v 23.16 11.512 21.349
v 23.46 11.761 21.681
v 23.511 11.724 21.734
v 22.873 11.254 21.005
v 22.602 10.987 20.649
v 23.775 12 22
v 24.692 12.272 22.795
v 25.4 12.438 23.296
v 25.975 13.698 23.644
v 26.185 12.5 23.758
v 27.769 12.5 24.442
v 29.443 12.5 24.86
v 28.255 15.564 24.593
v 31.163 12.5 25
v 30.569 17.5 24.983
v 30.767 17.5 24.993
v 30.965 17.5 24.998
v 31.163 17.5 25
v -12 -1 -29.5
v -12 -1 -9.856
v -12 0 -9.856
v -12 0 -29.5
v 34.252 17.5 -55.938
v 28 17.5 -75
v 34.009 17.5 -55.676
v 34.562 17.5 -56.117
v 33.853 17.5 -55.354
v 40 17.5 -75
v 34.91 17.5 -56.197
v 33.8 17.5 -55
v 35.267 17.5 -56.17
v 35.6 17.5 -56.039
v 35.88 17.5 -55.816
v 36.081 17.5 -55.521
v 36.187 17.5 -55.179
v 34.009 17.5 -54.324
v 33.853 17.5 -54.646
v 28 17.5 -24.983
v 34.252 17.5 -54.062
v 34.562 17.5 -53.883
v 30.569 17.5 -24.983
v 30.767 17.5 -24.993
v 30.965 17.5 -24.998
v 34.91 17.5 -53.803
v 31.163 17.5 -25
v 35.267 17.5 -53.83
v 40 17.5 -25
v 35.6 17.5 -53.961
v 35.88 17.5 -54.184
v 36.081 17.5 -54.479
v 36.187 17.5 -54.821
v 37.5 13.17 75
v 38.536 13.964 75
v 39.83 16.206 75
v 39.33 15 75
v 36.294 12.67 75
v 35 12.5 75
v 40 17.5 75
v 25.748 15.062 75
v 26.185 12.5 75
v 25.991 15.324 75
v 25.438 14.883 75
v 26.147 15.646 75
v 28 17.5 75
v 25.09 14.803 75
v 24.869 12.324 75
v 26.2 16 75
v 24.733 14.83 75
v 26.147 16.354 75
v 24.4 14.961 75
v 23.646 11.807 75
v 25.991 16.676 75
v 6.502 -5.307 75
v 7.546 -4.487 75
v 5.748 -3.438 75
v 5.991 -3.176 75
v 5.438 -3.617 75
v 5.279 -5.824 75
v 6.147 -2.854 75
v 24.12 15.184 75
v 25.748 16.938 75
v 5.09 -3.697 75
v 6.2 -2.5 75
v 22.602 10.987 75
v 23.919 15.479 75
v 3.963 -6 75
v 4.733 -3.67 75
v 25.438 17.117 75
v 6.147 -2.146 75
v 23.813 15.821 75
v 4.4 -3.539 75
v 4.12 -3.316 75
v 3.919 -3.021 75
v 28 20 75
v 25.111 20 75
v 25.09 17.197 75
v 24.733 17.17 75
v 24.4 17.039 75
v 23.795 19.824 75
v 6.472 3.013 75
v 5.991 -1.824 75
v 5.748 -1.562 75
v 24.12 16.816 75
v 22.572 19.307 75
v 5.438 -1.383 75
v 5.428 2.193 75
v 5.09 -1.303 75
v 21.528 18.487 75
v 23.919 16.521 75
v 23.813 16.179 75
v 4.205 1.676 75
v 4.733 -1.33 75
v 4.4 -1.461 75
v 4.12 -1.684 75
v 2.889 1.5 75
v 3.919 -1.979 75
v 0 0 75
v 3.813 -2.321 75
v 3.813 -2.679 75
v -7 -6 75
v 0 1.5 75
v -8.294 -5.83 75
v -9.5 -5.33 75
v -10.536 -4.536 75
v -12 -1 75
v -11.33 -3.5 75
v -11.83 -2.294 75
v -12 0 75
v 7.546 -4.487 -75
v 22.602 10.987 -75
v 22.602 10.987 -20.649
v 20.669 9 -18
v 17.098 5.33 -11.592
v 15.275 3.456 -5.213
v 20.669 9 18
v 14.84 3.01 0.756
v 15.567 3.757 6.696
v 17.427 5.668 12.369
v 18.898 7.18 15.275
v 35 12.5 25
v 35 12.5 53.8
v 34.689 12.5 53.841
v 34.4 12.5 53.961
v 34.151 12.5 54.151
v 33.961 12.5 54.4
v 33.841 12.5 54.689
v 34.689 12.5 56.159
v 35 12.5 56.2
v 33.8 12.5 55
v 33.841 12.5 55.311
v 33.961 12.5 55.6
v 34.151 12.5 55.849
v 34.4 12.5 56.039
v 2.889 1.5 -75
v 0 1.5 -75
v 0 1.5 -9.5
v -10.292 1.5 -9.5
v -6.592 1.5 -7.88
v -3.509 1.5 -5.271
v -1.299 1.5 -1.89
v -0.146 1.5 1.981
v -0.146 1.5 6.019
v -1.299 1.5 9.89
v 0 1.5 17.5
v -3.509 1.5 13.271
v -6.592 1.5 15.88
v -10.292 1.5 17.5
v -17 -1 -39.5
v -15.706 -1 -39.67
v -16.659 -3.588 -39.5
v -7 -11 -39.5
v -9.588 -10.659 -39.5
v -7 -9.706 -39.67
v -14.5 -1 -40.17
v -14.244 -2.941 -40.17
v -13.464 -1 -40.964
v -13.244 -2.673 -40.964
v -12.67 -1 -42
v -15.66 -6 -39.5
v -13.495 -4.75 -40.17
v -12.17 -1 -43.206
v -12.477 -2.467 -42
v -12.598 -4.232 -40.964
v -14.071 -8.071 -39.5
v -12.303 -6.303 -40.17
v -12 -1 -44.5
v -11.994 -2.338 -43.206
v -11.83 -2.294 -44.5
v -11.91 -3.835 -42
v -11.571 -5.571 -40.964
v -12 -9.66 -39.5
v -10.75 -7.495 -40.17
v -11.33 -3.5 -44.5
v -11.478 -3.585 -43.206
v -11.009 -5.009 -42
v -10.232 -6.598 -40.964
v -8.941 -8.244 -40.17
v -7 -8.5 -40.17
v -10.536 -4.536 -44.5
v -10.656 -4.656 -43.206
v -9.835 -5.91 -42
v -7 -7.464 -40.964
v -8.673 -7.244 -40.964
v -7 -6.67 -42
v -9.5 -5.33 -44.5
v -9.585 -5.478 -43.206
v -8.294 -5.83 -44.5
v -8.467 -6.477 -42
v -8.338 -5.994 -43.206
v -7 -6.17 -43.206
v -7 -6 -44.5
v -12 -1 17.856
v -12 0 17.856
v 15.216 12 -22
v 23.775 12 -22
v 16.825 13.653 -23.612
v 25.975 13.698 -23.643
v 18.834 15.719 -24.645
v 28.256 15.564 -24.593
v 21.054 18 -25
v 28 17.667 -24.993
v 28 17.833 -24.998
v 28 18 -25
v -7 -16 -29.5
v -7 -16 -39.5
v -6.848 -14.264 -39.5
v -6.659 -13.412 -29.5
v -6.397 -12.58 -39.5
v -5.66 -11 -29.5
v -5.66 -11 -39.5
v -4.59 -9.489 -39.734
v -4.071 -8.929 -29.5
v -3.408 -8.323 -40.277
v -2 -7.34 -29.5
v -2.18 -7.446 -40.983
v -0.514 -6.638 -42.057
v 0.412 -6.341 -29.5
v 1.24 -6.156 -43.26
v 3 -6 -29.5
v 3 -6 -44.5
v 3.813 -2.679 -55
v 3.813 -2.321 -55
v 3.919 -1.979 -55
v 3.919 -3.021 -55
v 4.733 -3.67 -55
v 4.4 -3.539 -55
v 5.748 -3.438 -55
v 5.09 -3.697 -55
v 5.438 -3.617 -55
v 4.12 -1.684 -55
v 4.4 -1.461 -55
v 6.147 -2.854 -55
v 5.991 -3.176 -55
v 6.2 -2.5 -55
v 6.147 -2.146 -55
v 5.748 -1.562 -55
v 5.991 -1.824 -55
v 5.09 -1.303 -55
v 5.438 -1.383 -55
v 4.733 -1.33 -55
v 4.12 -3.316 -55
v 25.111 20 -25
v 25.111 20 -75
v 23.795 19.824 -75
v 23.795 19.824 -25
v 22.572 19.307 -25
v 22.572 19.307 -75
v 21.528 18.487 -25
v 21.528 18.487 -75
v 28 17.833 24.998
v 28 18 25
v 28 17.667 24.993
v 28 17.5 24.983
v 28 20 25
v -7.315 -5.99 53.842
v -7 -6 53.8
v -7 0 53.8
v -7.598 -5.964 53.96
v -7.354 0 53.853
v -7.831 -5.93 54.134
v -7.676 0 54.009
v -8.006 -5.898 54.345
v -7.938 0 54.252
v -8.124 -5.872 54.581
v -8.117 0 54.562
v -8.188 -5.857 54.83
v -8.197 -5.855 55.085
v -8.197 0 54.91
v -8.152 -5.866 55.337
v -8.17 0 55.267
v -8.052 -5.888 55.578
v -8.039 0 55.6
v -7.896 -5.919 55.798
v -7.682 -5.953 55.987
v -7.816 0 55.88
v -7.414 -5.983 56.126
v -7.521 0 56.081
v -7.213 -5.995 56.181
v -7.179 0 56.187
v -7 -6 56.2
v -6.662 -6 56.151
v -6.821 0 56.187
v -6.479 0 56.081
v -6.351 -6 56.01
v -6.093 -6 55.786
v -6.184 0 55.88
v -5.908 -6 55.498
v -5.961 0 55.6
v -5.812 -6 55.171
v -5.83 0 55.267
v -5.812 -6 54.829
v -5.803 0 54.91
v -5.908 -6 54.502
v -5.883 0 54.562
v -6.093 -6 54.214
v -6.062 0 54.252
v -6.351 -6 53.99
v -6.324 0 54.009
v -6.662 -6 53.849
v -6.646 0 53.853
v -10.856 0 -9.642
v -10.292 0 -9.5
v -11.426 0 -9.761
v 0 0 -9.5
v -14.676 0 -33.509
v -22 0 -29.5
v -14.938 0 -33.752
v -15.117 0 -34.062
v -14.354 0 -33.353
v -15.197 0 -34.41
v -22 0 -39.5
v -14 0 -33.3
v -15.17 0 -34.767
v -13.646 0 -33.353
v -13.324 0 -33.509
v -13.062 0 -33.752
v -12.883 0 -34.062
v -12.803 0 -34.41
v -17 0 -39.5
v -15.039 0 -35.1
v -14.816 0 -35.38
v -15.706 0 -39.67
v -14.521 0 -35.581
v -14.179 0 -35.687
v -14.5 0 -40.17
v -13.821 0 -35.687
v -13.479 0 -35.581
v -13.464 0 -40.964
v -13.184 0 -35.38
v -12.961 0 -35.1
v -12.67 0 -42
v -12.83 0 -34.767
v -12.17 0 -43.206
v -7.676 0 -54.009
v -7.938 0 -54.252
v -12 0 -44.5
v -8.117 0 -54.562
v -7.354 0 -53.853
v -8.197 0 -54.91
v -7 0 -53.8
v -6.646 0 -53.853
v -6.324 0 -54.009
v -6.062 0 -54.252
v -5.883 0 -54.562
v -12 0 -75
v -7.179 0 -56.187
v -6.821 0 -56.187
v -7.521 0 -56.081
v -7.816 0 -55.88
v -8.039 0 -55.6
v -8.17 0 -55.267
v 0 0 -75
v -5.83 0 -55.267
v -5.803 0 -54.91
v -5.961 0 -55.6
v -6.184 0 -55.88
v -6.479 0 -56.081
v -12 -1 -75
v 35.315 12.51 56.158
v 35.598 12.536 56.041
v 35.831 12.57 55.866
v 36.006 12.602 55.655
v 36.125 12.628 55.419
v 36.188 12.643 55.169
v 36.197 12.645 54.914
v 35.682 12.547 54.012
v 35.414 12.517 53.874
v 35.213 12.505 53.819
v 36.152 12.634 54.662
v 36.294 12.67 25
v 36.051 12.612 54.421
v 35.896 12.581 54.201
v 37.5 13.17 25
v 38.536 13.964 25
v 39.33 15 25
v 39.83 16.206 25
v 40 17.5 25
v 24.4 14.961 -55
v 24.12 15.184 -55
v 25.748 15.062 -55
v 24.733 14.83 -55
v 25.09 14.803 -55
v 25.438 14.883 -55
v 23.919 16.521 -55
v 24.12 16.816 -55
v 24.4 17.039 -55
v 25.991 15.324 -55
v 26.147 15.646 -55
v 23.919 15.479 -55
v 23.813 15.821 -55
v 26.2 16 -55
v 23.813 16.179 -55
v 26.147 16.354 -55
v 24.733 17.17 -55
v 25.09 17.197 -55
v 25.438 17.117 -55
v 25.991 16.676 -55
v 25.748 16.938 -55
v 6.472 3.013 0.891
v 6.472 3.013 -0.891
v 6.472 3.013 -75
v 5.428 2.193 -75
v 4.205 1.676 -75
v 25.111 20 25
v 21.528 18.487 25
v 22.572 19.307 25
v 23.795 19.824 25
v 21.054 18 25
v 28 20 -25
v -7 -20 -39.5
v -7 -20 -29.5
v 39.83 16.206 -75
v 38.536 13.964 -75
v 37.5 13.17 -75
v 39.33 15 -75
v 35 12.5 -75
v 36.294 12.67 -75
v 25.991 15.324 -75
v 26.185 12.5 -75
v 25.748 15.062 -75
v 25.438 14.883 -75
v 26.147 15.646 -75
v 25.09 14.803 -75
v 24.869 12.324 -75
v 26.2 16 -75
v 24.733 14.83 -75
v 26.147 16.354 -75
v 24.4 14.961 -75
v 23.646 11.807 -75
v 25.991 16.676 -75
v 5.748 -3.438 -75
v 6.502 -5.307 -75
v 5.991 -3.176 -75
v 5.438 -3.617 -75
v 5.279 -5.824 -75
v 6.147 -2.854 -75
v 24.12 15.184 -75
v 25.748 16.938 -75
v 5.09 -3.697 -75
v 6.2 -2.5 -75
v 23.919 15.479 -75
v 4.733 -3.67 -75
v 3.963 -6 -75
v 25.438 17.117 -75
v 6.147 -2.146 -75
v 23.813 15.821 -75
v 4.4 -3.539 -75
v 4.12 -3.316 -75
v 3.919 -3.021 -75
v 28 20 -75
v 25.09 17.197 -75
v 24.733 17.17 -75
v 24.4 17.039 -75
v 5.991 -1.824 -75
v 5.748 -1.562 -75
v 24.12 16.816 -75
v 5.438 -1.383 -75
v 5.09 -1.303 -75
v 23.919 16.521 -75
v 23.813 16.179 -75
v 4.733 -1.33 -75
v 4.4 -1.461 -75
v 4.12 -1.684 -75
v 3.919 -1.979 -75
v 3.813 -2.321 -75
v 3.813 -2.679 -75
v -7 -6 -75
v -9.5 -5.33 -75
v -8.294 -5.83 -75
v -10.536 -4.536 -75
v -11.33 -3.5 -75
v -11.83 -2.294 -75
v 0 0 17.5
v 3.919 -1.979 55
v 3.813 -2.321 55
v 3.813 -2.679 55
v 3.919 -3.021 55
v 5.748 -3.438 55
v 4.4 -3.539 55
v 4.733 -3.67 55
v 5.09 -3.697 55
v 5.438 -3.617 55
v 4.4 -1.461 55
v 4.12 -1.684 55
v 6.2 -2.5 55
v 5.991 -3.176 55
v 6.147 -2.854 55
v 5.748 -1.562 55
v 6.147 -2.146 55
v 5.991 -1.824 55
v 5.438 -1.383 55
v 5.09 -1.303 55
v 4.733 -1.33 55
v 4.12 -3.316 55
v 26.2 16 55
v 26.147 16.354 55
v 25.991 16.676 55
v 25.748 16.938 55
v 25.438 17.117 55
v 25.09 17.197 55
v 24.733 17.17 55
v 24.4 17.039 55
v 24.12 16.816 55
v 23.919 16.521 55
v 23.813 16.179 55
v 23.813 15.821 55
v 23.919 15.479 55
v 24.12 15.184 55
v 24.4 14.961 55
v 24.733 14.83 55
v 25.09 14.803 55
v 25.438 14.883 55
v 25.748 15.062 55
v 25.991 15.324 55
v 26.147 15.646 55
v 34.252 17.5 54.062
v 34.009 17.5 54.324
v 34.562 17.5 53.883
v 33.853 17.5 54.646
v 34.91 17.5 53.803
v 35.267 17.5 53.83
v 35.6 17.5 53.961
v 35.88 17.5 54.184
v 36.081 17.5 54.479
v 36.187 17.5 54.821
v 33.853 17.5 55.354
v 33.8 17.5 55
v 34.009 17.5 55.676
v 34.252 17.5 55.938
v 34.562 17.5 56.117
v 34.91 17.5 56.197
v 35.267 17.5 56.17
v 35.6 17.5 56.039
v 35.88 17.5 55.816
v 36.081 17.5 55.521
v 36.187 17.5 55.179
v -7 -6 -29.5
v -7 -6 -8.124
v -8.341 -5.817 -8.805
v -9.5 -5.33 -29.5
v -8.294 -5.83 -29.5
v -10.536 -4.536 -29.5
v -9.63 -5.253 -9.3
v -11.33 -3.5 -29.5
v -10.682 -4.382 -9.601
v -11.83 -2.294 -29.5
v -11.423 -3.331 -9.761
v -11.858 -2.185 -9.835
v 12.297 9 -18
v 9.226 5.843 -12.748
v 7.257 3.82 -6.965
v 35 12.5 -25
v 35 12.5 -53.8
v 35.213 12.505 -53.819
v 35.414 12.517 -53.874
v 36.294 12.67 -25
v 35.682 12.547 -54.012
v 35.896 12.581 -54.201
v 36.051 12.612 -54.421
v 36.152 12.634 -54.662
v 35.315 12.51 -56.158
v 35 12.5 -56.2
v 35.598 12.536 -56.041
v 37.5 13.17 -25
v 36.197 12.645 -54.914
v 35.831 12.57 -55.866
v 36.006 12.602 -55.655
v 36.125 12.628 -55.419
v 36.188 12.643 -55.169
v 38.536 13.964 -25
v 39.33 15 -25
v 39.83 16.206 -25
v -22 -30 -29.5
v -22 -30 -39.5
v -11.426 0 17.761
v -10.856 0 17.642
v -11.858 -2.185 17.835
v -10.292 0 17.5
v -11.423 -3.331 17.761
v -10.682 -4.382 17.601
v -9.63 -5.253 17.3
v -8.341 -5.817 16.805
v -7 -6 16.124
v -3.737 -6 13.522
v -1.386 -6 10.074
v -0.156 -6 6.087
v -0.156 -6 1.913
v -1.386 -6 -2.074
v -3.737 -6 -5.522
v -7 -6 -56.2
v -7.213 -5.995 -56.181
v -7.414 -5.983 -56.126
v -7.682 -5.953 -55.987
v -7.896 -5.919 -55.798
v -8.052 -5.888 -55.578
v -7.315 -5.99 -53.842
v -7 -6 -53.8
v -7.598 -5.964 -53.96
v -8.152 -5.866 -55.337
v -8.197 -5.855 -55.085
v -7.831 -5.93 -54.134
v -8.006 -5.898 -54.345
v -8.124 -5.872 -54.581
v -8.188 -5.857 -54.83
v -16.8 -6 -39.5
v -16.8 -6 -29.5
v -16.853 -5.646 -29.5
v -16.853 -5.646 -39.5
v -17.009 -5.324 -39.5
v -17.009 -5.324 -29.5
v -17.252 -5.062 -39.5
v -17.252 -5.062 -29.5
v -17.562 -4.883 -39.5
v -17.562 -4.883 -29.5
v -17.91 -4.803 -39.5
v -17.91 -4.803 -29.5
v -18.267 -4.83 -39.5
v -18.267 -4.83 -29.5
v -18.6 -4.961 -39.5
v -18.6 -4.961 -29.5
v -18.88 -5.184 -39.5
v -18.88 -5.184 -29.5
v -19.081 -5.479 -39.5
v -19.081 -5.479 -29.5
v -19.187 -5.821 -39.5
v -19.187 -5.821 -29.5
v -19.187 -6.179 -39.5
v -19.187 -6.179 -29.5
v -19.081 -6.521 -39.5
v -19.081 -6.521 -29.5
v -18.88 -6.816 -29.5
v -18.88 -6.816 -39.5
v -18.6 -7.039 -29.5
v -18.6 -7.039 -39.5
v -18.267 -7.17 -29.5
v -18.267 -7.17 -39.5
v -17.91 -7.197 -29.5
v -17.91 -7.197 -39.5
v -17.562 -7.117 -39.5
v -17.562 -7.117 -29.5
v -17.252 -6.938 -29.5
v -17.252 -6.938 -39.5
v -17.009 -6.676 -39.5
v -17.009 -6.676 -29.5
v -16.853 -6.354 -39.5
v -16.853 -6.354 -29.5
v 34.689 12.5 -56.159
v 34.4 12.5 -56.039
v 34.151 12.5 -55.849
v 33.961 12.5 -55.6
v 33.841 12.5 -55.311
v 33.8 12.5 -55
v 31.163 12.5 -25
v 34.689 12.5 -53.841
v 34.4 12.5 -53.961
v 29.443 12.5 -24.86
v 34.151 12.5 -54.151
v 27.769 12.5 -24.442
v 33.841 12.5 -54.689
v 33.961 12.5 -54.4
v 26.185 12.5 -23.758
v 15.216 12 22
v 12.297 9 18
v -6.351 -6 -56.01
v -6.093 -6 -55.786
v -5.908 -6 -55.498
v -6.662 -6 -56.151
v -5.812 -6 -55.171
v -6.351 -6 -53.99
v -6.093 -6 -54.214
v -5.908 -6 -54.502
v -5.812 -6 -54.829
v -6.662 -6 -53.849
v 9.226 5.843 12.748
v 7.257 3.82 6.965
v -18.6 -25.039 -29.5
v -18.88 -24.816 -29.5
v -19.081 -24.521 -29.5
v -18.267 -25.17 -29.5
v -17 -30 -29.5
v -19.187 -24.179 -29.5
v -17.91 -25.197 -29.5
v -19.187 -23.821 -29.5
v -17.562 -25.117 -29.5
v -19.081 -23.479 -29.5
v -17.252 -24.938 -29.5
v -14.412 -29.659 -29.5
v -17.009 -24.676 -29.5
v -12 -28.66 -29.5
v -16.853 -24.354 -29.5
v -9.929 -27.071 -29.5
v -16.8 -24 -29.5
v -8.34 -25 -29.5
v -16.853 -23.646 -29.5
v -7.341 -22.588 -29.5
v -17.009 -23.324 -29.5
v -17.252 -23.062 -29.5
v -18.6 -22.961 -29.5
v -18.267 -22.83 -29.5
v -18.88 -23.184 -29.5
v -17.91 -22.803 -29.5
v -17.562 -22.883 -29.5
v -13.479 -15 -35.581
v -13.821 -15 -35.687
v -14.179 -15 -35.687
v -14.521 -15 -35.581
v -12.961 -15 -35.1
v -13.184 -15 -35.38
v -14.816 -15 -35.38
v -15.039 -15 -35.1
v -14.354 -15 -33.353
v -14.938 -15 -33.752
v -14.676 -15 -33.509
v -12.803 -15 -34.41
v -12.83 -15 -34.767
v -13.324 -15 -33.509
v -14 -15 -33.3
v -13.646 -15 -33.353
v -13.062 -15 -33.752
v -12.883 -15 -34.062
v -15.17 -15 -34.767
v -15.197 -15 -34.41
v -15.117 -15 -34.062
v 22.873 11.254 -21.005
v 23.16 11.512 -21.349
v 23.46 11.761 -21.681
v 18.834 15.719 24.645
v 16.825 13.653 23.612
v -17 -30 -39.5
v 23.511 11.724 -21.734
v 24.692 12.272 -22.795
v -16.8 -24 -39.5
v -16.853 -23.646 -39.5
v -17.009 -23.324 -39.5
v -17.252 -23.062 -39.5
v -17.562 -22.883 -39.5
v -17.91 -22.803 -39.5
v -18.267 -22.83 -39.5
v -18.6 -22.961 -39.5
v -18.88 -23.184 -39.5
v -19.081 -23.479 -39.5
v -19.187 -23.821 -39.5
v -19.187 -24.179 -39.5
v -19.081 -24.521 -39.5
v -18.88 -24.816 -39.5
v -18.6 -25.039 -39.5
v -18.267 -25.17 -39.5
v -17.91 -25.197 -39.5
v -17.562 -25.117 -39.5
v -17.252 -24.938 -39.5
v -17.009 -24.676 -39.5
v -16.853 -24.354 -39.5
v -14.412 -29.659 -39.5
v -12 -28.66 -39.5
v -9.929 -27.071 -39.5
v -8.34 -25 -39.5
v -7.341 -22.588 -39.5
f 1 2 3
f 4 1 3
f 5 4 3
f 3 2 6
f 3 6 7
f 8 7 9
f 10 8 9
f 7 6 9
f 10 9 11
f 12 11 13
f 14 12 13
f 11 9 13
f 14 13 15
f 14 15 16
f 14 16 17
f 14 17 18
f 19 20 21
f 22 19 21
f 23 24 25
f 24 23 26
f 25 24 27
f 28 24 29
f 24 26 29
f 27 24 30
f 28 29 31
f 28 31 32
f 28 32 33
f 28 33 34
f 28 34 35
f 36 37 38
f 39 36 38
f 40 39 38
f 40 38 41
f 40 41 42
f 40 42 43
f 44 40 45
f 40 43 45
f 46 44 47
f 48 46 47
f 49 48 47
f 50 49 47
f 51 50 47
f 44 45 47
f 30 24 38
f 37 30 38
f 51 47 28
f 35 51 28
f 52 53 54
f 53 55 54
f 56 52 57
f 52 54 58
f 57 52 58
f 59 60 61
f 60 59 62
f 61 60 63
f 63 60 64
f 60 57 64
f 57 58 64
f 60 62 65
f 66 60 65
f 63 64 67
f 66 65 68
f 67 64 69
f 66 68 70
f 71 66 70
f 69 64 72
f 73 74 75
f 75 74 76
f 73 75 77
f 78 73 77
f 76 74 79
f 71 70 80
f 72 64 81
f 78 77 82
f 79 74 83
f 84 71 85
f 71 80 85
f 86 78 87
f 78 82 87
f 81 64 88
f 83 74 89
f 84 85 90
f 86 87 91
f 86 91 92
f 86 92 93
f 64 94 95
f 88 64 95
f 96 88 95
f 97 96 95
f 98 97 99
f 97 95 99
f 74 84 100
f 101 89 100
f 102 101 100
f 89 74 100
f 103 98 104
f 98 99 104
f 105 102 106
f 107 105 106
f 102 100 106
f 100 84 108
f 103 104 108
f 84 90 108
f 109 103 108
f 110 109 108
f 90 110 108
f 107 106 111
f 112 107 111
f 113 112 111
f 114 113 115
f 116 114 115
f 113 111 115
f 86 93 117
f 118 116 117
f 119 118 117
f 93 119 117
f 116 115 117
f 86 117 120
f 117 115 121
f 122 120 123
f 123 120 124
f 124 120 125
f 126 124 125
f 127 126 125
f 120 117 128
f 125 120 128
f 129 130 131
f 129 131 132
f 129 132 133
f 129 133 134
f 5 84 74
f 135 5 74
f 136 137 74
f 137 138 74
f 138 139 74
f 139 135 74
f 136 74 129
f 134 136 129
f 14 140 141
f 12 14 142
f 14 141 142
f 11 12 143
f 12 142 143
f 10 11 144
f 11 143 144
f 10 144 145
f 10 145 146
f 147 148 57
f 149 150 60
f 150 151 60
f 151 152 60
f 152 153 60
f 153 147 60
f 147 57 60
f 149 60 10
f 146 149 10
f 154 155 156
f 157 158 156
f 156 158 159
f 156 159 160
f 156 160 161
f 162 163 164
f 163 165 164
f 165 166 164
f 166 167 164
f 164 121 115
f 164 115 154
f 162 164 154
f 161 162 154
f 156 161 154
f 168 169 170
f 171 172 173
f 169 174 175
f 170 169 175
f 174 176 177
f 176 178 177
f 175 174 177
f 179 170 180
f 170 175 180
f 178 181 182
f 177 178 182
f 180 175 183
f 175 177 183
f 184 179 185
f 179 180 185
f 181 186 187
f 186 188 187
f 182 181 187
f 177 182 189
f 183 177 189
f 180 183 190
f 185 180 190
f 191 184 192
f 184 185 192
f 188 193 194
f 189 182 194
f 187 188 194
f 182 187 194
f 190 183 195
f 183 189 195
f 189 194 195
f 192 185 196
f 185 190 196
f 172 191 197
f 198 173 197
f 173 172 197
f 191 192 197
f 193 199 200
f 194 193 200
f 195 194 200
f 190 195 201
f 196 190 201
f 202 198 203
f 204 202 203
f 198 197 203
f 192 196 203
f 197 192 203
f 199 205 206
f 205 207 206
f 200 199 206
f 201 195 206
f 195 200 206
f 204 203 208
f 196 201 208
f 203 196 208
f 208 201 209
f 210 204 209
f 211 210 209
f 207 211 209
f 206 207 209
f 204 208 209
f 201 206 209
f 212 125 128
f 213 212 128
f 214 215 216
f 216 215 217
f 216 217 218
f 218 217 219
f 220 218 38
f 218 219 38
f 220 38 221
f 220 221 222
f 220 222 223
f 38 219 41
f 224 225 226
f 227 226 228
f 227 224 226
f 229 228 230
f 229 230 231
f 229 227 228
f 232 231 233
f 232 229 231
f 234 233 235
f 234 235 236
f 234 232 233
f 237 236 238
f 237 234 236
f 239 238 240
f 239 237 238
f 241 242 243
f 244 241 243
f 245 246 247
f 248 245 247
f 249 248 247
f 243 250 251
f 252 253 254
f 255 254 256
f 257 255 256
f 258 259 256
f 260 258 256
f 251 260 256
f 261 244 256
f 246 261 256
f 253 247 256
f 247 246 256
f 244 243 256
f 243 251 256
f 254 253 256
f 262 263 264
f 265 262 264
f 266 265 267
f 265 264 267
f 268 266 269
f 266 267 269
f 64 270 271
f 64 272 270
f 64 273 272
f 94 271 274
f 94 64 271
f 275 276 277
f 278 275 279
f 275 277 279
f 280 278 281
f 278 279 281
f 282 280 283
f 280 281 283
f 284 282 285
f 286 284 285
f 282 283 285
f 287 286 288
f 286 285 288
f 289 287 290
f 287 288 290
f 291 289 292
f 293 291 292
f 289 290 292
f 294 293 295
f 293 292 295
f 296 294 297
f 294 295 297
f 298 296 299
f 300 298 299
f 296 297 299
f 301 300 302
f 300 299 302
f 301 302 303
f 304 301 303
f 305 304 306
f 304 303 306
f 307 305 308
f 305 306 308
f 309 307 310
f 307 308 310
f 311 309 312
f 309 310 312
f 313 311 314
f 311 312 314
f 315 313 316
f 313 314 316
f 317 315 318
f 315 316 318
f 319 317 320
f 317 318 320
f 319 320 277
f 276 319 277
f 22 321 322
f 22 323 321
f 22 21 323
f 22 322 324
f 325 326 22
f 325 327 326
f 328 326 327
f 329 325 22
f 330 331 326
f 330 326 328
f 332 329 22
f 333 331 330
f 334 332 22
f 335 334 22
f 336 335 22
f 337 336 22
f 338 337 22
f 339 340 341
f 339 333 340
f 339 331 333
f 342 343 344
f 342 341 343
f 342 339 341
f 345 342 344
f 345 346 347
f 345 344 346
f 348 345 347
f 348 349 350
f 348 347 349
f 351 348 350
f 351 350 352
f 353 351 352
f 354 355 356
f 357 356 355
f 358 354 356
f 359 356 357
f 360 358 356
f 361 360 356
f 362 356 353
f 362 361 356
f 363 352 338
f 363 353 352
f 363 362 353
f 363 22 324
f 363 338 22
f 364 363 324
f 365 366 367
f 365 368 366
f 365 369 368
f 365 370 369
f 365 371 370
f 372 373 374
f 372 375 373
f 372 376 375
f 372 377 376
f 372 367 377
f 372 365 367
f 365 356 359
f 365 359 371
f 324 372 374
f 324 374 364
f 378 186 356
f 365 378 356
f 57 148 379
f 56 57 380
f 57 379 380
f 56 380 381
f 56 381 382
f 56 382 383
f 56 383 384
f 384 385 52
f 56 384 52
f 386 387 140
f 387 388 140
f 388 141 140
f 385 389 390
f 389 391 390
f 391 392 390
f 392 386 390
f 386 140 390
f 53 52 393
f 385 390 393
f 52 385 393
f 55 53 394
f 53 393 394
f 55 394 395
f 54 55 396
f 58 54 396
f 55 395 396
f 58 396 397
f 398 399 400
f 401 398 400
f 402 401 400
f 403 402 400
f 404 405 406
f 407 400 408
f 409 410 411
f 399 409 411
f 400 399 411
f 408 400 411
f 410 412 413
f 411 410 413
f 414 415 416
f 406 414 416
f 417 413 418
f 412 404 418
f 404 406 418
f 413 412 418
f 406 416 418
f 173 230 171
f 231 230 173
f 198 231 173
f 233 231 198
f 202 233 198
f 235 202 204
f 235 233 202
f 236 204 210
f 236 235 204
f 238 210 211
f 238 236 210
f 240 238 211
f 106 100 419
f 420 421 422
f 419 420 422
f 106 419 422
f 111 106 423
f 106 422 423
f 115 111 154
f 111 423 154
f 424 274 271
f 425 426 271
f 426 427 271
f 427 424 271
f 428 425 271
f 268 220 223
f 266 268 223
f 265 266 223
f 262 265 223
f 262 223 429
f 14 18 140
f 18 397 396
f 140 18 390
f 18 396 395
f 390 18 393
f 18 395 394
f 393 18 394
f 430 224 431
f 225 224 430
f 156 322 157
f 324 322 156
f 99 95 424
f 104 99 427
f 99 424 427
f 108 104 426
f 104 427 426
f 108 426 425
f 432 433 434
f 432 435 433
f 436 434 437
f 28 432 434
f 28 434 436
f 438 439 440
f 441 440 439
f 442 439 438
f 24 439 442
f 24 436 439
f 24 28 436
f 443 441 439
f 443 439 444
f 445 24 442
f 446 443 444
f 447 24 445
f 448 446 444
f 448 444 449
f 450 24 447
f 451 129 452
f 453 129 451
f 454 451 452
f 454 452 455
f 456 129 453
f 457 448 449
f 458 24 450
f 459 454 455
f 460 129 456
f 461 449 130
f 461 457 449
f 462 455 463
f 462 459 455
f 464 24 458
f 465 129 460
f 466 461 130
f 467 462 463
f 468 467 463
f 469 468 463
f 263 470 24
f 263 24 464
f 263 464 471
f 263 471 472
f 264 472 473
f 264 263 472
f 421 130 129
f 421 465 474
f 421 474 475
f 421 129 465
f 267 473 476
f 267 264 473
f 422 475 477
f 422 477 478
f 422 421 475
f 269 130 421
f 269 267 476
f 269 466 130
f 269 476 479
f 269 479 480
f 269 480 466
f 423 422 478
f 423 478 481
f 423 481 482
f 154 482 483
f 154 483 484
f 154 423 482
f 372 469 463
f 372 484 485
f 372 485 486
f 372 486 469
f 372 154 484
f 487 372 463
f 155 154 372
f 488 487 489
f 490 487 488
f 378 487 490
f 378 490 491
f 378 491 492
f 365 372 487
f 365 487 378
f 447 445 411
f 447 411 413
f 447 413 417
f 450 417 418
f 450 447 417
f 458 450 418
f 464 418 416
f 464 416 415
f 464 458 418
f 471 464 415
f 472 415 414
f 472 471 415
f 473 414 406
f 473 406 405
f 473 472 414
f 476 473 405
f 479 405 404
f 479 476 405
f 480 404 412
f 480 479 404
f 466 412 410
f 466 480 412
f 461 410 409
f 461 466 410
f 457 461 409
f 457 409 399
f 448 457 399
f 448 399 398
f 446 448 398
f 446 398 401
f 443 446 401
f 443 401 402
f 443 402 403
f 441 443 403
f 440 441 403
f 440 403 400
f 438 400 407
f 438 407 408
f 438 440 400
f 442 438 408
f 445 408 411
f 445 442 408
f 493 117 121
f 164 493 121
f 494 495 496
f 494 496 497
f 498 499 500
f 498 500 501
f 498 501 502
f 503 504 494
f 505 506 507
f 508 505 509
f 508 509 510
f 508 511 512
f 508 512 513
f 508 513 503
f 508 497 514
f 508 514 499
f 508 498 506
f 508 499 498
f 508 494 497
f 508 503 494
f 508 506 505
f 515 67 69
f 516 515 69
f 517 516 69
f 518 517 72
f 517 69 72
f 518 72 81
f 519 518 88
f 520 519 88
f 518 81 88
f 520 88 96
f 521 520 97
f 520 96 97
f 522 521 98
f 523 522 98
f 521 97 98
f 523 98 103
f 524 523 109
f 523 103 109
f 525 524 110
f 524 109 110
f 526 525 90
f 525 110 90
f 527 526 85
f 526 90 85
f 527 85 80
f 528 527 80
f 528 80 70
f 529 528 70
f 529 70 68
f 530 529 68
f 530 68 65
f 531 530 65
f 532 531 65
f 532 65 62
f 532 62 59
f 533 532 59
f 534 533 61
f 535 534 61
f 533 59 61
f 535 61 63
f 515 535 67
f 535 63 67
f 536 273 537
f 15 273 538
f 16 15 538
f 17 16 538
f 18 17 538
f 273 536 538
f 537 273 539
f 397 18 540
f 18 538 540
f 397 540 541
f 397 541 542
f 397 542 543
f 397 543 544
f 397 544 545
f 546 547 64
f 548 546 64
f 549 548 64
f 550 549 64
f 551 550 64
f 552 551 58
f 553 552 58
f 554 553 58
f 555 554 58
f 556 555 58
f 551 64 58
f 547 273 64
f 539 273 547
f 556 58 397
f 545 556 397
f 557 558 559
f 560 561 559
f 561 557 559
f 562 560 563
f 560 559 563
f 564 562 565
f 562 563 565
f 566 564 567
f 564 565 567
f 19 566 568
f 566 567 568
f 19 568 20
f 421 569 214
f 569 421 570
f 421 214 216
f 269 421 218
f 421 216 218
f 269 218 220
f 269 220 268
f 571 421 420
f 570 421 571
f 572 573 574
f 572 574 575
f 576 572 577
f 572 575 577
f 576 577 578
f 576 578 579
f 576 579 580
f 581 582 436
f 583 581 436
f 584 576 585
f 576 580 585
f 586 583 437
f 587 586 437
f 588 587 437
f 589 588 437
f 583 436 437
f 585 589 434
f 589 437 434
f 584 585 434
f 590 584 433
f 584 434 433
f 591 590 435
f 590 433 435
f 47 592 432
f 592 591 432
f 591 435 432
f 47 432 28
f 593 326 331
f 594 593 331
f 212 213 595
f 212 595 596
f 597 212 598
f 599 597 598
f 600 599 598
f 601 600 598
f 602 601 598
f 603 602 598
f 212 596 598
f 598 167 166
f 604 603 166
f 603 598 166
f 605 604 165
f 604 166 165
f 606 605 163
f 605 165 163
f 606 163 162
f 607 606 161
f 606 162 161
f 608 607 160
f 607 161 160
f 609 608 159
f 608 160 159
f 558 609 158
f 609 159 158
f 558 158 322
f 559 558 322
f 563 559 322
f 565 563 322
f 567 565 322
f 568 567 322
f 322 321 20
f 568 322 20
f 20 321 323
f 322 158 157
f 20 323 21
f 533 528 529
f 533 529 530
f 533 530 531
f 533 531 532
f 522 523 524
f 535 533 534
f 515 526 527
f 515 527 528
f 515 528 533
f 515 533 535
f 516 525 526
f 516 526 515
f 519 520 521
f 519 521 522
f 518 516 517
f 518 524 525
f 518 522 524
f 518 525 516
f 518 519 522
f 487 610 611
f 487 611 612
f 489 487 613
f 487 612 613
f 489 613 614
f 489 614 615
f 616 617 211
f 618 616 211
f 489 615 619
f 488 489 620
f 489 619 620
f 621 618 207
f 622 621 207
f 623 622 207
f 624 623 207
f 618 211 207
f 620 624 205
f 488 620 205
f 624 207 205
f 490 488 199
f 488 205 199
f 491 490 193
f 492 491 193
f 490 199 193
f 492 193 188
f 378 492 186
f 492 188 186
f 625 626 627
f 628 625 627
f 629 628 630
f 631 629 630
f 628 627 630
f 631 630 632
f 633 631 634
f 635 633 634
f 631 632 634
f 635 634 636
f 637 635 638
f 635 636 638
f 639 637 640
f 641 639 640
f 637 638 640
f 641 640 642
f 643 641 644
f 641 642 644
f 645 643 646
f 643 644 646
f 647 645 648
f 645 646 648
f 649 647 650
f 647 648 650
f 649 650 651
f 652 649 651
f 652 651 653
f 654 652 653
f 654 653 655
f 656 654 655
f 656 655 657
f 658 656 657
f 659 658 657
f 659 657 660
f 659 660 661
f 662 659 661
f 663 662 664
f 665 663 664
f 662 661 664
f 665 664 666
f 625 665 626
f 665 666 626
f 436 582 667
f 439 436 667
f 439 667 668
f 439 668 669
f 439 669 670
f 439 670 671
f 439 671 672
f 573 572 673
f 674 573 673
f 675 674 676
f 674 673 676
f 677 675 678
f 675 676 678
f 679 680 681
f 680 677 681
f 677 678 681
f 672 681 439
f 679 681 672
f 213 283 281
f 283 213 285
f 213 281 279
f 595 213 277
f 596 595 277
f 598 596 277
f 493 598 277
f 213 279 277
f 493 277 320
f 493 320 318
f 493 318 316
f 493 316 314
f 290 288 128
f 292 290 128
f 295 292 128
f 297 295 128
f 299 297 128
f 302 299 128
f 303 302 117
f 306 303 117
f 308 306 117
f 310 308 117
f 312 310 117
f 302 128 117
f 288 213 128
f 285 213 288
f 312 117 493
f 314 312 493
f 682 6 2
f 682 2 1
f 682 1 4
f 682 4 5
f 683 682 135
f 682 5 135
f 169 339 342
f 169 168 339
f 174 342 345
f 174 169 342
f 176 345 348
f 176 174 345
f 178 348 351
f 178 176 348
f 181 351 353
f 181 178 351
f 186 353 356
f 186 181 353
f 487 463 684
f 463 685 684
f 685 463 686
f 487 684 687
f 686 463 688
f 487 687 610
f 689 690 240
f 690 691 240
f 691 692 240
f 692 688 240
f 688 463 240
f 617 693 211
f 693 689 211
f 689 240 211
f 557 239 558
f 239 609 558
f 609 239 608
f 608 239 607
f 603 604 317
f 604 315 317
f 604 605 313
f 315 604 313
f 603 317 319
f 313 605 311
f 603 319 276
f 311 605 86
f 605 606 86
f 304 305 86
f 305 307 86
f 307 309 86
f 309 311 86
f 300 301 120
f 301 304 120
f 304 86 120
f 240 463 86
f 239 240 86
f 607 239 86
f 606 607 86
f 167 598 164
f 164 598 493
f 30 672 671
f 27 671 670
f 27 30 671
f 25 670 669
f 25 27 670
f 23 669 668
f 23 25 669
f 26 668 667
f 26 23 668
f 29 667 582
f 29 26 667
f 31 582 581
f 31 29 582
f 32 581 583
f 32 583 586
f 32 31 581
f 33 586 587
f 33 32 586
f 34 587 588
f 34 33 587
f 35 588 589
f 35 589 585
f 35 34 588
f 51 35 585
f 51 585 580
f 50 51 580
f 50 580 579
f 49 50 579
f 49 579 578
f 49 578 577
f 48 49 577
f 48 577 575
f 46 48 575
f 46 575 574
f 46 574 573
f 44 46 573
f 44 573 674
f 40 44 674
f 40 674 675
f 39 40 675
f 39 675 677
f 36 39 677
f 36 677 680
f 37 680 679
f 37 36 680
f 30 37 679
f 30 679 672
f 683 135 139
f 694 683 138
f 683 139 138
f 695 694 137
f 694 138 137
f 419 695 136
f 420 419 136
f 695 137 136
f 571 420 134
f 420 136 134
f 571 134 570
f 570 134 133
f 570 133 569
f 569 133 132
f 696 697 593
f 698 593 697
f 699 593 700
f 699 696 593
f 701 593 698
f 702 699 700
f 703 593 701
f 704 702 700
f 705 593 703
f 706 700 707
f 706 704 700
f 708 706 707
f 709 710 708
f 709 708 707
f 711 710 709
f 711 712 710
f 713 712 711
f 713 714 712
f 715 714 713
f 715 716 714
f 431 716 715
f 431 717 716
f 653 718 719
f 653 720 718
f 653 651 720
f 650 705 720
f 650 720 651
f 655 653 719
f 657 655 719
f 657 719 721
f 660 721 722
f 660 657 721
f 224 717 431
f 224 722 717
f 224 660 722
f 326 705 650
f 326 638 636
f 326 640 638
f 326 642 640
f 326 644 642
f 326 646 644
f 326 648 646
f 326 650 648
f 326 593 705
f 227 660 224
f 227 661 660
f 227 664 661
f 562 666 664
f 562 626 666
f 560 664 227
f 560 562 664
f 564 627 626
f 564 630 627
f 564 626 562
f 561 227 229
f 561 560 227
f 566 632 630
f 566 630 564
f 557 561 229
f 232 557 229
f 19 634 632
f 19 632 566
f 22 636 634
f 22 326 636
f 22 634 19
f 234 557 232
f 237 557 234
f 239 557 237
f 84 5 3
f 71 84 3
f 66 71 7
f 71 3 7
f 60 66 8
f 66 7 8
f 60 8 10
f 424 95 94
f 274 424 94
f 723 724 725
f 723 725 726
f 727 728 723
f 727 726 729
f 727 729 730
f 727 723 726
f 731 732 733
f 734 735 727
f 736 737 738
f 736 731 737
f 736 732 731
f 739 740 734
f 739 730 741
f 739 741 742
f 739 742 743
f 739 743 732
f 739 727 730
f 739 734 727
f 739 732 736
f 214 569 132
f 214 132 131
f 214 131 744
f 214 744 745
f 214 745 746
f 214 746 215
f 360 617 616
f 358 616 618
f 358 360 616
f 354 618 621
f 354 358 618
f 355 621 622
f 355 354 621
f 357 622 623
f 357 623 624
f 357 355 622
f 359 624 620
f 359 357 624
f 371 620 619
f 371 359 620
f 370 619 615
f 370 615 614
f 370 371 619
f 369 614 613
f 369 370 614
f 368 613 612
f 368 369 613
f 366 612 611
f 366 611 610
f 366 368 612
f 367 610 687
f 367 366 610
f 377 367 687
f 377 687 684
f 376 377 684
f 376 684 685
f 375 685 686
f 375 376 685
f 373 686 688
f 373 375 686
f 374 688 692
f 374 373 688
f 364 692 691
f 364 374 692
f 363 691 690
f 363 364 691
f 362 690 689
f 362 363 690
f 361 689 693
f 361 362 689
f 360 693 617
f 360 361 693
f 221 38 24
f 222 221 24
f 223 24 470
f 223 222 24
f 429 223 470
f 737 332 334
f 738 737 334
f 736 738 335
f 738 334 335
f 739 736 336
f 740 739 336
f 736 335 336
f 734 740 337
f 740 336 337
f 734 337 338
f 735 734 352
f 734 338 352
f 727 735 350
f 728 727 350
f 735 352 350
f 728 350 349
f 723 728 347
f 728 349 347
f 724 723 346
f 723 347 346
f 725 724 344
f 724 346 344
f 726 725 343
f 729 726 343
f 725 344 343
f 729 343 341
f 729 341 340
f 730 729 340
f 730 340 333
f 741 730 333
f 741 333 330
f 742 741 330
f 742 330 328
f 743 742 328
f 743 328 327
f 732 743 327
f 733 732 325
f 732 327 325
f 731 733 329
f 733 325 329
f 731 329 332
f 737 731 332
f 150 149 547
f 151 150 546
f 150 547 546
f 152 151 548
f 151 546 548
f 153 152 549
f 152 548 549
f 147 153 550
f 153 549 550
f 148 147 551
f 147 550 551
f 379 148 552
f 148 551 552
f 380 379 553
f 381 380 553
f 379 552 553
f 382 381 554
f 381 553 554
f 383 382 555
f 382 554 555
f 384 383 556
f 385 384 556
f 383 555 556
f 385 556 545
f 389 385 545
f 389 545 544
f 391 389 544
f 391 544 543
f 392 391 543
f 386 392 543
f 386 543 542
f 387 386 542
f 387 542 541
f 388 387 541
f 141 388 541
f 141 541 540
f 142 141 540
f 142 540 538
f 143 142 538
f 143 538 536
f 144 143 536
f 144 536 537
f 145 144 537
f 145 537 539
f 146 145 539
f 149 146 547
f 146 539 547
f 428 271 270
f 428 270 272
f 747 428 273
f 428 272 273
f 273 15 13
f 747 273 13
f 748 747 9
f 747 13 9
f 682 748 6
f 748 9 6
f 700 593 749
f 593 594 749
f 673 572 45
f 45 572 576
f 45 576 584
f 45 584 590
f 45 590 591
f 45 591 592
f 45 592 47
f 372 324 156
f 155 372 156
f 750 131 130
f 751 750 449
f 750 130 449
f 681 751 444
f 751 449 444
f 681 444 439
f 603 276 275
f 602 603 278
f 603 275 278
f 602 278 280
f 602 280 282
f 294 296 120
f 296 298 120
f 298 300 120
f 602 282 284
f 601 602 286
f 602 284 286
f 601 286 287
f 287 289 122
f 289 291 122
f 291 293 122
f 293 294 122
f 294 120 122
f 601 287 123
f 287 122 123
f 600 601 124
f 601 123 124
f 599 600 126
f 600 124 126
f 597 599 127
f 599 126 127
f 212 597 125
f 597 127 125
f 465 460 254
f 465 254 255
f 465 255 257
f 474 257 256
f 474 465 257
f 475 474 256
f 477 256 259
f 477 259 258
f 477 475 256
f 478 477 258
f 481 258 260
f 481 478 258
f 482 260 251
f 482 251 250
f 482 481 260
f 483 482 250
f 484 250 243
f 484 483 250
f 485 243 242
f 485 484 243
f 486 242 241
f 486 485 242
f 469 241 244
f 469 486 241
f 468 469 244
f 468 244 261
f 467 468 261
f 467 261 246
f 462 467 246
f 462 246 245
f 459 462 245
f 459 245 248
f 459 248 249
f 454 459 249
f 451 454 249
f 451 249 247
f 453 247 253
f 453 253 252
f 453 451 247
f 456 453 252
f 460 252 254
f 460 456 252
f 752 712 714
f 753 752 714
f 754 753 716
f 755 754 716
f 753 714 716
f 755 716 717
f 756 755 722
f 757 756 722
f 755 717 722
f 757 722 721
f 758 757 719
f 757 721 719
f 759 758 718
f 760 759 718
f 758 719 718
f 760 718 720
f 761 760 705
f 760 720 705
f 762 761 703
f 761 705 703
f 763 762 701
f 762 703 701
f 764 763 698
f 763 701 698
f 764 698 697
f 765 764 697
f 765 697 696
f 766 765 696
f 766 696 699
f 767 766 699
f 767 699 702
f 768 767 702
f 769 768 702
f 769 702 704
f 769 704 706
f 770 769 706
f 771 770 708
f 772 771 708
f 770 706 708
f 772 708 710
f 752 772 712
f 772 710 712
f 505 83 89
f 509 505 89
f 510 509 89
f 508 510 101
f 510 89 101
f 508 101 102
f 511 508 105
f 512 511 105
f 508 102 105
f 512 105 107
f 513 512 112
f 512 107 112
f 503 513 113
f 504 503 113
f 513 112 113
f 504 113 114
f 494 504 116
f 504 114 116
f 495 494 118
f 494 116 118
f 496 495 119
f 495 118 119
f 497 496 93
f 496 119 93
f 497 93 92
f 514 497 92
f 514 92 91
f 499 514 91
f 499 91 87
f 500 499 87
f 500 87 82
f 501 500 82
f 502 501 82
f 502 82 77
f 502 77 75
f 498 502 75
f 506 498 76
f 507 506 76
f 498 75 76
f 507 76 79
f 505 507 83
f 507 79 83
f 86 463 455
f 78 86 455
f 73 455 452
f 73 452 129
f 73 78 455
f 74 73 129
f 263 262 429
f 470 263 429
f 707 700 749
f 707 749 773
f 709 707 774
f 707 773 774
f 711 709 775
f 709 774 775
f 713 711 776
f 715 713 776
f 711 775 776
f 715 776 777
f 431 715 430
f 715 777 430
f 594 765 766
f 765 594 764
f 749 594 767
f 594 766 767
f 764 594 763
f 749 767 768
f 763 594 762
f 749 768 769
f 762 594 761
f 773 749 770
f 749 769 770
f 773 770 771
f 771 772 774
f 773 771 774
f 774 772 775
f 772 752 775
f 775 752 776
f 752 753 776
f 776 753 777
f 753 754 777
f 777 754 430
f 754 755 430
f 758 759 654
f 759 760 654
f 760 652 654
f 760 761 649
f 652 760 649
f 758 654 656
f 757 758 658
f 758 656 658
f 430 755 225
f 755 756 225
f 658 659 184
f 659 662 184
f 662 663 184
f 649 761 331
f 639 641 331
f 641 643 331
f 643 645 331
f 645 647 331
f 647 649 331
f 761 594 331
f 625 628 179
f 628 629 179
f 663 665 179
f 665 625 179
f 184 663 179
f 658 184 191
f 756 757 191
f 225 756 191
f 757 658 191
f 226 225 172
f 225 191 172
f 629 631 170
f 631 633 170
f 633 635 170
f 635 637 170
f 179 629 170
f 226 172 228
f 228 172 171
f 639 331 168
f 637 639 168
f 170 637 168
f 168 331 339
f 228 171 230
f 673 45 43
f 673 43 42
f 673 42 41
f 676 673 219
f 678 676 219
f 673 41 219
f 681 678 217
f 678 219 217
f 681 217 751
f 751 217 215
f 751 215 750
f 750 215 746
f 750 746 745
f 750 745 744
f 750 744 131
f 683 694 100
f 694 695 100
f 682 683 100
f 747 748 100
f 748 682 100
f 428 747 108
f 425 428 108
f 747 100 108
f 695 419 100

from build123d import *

# Parameters (mm, degrees)
BOSS_EXTRU_1_DEPTH      = 75
CONG_1_R                = 5
ESQUISSE2_W             = 12
ESQUISSE2_H             = 27
BOSS_EXTRU_2_DEPTH      = 1.5
ESQUISSE3_R             = 14
ENL_V_MAT_EXTRU_1_DEPTH = 87.989941947
ENL_V_MAT_EXTRU_2_DEPTH = 94.429117653
ENL_V_MAT_EXTRU_3_DEPTH = 89.887569593
ESQUISSE6_R             = 1.2
ENL_V_MAT_EXTRU_4_DEPTH = 20
ESQUISSE7_R             = 1.2
ENL_V_MAT_EXTRU_5_DEPTH = 89.46044325
ESQUISSE9_W             = 15
ESQUISSE9_H             = 10
BOSS_EXTRU_3_DEPTH      = 30
CONG_2_R                = 10
CONG_3_R                = 5
ESQUISSE10_R            = 1.2
ENL_V_MAT_EXTRU_6_DEPTH = 10
ESQUISSE11_R            = 1.2
ENL_V_MAT_EXTRU_7_DEPTH = 15
ESQUISSE12_W            = 12
ESQUISSE12_H            = 2.5
ENL_V_MAT_EXTRU_8_DEPTH = 159.113883129


with BuildPart() as part:
    # Esquisse1 → Boss.-Extru.1 (new, symmetric)
    with BuildSketch(Plane.XY):
        Polygon((-12, 0), (0, 0), (0, 1.5), (5, 1.5), (23, 20), (28, 20), (28, 18.5), (40, 18.5), (40, 12.5), (24.074103459, 12.5), (6.074103459, -6), (-12, -6), align=None)
    extrude(amount=BOSS_EXTRU_1_DEPTH, both=True)

    # Congé1
    cong_1_edges = [part.edges().sort_by_distance(p)[0] for p in [
        (5, 1.5, 0),
        (23, 20, 0),
        (40, 12.5, 0),
        (24.074103459, 12.5, 0),
        (6.074103459, -6, 0),
        (-12, -6, 0),
    ]]
    fillet(cong_1_edges, radius=CONG_1_R)

    # Esquisse2 → Boss.-Extru.2 (add)
    with BuildSketch(Plane(origin=(0, 0, 0), x_dir=(1, 0, 0), z_dir=(0, 1, 0))):
        with Locations((-6, -4)):
            Rectangle(ESQUISSE2_W, ESQUISSE2_H)
    extrude(amount=BOSS_EXTRU_2_DEPTH)

    # Esquisse3 → Enlèv. mat.-Extru.1 (cut, through all)
    with BuildSketch(Plane(origin=(0, 1.5, 0), x_dir=(1, 0, 0), z_dir=(0, 1, 0))):
        with Locations((-14, -4)):
            Circle(ESQUISSE3_R)
    extrude(amount=-ENL_V_MAT_EXTRU_1_DEPTH, mode=Mode.SUBTRACT)

    # Esquisse4 → Enlèv. mat.-Extru.2 (cut, through all)
    with BuildSketch(Plane(origin=(40, 0, 0), x_dir=(0, 0, -1), z_dir=(1, 0, 0))):
        with BuildLine():
            Line((-22, 12), (-18, 9))
            ThreePointArc((-18, 9), (0, 3), (18, 9))
            Line((18, 9), (22, 12))
            ThreePointArc((22, 12), (24.208203932, 14.645898034), (25, 18))
            Line((25, 18), (25, 20))
            Line((25, 20), (-25, 20))
            Line((-25, 20), (-25, 18))
            ThreePointArc((-25, 18), (-24.208203932, 14.645898034), (-22, 12))
        make_face()
    extrude(amount=-ENL_V_MAT_EXTRU_2_DEPTH, mode=Mode.SUBTRACT)

    # Esquisse5 → Enlèv. mat.-Extru.3 (cut, through all)
    with BuildSketch(Plane(origin=(0, 20, 0), x_dir=(1, 0, 0), z_dir=(0, 1, 0))):
        with BuildLine():
            Line((40, 25), (31.163059803, 25))
            ThreePointArc((31.163059803, 25), (26.361328616, 23.849850491), (22.601776236, 20.649033065))
            Line((22.601776236, 20.649033065), (22.601776236, -20.649033065))
            ThreePointArc((22.601776236, -20.649033065), (26.361328616, -23.849850491), (31.163059803, -25))
            Line((31.163059803, -25), (40, -25))
            Line((40, -25), (40, 25))
        make_face()
    extrude(amount=-ENL_V_MAT_EXTRU_3_DEPTH, mode=Mode.SUBTRACT)

    # Esquisse6 → Enlèv. mat.-Extru.4 (cut)
    with BuildSketch(Plane.XY.offset(75)):
        with Locations((25, 16)):
            Circle(ESQUISSE6_R)
        with Locations((5, -2.5)):
            Circle(ESQUISSE6_R)
    enl_v_mat_extru_4 = extrude(amount=-ENL_V_MAT_EXTRU_4_DEPTH, mode=Mode.SUBTRACT)

    # Esquisse7 → Enlèv. mat.-Extru.5 (cut, through all)
    with BuildSketch(Plane(origin=(0, 18.5, 0), x_dir=(1, 0, 0), z_dir=(0, 1, 0))):
        with Locations(Location((35, -55, 0), (0, 0, 180))):
            Circle(ESQUISSE7_R)
        with Locations(Location((-7, -55, 0), (0, 0, 90))):
            Circle(ESQUISSE7_R)
    enl_v_mat_extru_5 = extrude(amount=-ENL_V_MAT_EXTRU_5_DEPTH, mode=Mode.SUBTRACT)

    # Symétrie1: Enlèv. mat.-Extru.4, Enlèv. mat.-Extru.5 across plane
    add(enl_v_mat_extru_4.mirror(Plane.XY), mode=Mode.SUBTRACT)
    add(enl_v_mat_extru_5.mirror(Plane.XY), mode=Mode.SUBTRACT)

    # Esquisse9 → Boss.-Extru.3 (add)
    with BuildSketch(Plane(origin=(0, 0, 0), x_dir=(1, 0, 0), z_dir=(0, 1, 0))):
        with Locations((-14.5, 34.5)):
            Rectangle(ESQUISSE9_W, ESQUISSE9_H)
    extrude(amount=-BOSS_EXTRU_3_DEPTH)

    # Congé2
    cong_2_edges = [part.edges().sort_by_distance(p)[0] for p in [
        (-7, -6, -34.5),
        (-7, -30, -34.5),
    ]]
    fillet(cong_2_edges, radius=CONG_2_R)

    # Congé3
    cong_3_edges = [part.edges().sort_by_distance(p)[0] for p in [
        (-12, -0.5, -39.5),
        (-10.535533906, -4.535533906, -39.5),
        (-2, -6, -39.5),
    ]]
    fillet(cong_3_edges, radius=CONG_3_R)

    # Esquisse10 → Enlèv. mat.-Extru.6 (cut)
    with BuildSketch(Plane.XY.offset(-29.5)):
        with Locations((-18, -24)):
            Circle(ESQUISSE10_R)
        with Locations((-18, -6)):
            Circle(ESQUISSE10_R)
    extrude(amount=-ENL_V_MAT_EXTRU_6_DEPTH, mode=Mode.SUBTRACT)

    # Esquisse11 → Enlèv. mat.-Extru.7 (cut)
    with BuildSketch(Plane(origin=(0, 0, 0), x_dir=(1, 0, 0), z_dir=(0, 1, 0))):
        with Locations(Location((-14, 34.5, 0), (0, 0, 270))):
            Circle(ESQUISSE11_R)
    extrude(amount=-ENL_V_MAT_EXTRU_7_DEPTH, mode=Mode.SUBTRACT)

    # Esquisse12 → Enlèv. mat.-Extru.8 (cut, through all)
    with BuildSketch(Plane.XY.offset(75)):
        with Locations((34, 18.75)):
            Rectangle(ESQUISSE12_W, ESQUISSE12_H)
    extrude(amount=-ENL_V_MAT_EXTRU_8_DEPTH, mode=Mode.SUBTRACT)


solid = part.part
